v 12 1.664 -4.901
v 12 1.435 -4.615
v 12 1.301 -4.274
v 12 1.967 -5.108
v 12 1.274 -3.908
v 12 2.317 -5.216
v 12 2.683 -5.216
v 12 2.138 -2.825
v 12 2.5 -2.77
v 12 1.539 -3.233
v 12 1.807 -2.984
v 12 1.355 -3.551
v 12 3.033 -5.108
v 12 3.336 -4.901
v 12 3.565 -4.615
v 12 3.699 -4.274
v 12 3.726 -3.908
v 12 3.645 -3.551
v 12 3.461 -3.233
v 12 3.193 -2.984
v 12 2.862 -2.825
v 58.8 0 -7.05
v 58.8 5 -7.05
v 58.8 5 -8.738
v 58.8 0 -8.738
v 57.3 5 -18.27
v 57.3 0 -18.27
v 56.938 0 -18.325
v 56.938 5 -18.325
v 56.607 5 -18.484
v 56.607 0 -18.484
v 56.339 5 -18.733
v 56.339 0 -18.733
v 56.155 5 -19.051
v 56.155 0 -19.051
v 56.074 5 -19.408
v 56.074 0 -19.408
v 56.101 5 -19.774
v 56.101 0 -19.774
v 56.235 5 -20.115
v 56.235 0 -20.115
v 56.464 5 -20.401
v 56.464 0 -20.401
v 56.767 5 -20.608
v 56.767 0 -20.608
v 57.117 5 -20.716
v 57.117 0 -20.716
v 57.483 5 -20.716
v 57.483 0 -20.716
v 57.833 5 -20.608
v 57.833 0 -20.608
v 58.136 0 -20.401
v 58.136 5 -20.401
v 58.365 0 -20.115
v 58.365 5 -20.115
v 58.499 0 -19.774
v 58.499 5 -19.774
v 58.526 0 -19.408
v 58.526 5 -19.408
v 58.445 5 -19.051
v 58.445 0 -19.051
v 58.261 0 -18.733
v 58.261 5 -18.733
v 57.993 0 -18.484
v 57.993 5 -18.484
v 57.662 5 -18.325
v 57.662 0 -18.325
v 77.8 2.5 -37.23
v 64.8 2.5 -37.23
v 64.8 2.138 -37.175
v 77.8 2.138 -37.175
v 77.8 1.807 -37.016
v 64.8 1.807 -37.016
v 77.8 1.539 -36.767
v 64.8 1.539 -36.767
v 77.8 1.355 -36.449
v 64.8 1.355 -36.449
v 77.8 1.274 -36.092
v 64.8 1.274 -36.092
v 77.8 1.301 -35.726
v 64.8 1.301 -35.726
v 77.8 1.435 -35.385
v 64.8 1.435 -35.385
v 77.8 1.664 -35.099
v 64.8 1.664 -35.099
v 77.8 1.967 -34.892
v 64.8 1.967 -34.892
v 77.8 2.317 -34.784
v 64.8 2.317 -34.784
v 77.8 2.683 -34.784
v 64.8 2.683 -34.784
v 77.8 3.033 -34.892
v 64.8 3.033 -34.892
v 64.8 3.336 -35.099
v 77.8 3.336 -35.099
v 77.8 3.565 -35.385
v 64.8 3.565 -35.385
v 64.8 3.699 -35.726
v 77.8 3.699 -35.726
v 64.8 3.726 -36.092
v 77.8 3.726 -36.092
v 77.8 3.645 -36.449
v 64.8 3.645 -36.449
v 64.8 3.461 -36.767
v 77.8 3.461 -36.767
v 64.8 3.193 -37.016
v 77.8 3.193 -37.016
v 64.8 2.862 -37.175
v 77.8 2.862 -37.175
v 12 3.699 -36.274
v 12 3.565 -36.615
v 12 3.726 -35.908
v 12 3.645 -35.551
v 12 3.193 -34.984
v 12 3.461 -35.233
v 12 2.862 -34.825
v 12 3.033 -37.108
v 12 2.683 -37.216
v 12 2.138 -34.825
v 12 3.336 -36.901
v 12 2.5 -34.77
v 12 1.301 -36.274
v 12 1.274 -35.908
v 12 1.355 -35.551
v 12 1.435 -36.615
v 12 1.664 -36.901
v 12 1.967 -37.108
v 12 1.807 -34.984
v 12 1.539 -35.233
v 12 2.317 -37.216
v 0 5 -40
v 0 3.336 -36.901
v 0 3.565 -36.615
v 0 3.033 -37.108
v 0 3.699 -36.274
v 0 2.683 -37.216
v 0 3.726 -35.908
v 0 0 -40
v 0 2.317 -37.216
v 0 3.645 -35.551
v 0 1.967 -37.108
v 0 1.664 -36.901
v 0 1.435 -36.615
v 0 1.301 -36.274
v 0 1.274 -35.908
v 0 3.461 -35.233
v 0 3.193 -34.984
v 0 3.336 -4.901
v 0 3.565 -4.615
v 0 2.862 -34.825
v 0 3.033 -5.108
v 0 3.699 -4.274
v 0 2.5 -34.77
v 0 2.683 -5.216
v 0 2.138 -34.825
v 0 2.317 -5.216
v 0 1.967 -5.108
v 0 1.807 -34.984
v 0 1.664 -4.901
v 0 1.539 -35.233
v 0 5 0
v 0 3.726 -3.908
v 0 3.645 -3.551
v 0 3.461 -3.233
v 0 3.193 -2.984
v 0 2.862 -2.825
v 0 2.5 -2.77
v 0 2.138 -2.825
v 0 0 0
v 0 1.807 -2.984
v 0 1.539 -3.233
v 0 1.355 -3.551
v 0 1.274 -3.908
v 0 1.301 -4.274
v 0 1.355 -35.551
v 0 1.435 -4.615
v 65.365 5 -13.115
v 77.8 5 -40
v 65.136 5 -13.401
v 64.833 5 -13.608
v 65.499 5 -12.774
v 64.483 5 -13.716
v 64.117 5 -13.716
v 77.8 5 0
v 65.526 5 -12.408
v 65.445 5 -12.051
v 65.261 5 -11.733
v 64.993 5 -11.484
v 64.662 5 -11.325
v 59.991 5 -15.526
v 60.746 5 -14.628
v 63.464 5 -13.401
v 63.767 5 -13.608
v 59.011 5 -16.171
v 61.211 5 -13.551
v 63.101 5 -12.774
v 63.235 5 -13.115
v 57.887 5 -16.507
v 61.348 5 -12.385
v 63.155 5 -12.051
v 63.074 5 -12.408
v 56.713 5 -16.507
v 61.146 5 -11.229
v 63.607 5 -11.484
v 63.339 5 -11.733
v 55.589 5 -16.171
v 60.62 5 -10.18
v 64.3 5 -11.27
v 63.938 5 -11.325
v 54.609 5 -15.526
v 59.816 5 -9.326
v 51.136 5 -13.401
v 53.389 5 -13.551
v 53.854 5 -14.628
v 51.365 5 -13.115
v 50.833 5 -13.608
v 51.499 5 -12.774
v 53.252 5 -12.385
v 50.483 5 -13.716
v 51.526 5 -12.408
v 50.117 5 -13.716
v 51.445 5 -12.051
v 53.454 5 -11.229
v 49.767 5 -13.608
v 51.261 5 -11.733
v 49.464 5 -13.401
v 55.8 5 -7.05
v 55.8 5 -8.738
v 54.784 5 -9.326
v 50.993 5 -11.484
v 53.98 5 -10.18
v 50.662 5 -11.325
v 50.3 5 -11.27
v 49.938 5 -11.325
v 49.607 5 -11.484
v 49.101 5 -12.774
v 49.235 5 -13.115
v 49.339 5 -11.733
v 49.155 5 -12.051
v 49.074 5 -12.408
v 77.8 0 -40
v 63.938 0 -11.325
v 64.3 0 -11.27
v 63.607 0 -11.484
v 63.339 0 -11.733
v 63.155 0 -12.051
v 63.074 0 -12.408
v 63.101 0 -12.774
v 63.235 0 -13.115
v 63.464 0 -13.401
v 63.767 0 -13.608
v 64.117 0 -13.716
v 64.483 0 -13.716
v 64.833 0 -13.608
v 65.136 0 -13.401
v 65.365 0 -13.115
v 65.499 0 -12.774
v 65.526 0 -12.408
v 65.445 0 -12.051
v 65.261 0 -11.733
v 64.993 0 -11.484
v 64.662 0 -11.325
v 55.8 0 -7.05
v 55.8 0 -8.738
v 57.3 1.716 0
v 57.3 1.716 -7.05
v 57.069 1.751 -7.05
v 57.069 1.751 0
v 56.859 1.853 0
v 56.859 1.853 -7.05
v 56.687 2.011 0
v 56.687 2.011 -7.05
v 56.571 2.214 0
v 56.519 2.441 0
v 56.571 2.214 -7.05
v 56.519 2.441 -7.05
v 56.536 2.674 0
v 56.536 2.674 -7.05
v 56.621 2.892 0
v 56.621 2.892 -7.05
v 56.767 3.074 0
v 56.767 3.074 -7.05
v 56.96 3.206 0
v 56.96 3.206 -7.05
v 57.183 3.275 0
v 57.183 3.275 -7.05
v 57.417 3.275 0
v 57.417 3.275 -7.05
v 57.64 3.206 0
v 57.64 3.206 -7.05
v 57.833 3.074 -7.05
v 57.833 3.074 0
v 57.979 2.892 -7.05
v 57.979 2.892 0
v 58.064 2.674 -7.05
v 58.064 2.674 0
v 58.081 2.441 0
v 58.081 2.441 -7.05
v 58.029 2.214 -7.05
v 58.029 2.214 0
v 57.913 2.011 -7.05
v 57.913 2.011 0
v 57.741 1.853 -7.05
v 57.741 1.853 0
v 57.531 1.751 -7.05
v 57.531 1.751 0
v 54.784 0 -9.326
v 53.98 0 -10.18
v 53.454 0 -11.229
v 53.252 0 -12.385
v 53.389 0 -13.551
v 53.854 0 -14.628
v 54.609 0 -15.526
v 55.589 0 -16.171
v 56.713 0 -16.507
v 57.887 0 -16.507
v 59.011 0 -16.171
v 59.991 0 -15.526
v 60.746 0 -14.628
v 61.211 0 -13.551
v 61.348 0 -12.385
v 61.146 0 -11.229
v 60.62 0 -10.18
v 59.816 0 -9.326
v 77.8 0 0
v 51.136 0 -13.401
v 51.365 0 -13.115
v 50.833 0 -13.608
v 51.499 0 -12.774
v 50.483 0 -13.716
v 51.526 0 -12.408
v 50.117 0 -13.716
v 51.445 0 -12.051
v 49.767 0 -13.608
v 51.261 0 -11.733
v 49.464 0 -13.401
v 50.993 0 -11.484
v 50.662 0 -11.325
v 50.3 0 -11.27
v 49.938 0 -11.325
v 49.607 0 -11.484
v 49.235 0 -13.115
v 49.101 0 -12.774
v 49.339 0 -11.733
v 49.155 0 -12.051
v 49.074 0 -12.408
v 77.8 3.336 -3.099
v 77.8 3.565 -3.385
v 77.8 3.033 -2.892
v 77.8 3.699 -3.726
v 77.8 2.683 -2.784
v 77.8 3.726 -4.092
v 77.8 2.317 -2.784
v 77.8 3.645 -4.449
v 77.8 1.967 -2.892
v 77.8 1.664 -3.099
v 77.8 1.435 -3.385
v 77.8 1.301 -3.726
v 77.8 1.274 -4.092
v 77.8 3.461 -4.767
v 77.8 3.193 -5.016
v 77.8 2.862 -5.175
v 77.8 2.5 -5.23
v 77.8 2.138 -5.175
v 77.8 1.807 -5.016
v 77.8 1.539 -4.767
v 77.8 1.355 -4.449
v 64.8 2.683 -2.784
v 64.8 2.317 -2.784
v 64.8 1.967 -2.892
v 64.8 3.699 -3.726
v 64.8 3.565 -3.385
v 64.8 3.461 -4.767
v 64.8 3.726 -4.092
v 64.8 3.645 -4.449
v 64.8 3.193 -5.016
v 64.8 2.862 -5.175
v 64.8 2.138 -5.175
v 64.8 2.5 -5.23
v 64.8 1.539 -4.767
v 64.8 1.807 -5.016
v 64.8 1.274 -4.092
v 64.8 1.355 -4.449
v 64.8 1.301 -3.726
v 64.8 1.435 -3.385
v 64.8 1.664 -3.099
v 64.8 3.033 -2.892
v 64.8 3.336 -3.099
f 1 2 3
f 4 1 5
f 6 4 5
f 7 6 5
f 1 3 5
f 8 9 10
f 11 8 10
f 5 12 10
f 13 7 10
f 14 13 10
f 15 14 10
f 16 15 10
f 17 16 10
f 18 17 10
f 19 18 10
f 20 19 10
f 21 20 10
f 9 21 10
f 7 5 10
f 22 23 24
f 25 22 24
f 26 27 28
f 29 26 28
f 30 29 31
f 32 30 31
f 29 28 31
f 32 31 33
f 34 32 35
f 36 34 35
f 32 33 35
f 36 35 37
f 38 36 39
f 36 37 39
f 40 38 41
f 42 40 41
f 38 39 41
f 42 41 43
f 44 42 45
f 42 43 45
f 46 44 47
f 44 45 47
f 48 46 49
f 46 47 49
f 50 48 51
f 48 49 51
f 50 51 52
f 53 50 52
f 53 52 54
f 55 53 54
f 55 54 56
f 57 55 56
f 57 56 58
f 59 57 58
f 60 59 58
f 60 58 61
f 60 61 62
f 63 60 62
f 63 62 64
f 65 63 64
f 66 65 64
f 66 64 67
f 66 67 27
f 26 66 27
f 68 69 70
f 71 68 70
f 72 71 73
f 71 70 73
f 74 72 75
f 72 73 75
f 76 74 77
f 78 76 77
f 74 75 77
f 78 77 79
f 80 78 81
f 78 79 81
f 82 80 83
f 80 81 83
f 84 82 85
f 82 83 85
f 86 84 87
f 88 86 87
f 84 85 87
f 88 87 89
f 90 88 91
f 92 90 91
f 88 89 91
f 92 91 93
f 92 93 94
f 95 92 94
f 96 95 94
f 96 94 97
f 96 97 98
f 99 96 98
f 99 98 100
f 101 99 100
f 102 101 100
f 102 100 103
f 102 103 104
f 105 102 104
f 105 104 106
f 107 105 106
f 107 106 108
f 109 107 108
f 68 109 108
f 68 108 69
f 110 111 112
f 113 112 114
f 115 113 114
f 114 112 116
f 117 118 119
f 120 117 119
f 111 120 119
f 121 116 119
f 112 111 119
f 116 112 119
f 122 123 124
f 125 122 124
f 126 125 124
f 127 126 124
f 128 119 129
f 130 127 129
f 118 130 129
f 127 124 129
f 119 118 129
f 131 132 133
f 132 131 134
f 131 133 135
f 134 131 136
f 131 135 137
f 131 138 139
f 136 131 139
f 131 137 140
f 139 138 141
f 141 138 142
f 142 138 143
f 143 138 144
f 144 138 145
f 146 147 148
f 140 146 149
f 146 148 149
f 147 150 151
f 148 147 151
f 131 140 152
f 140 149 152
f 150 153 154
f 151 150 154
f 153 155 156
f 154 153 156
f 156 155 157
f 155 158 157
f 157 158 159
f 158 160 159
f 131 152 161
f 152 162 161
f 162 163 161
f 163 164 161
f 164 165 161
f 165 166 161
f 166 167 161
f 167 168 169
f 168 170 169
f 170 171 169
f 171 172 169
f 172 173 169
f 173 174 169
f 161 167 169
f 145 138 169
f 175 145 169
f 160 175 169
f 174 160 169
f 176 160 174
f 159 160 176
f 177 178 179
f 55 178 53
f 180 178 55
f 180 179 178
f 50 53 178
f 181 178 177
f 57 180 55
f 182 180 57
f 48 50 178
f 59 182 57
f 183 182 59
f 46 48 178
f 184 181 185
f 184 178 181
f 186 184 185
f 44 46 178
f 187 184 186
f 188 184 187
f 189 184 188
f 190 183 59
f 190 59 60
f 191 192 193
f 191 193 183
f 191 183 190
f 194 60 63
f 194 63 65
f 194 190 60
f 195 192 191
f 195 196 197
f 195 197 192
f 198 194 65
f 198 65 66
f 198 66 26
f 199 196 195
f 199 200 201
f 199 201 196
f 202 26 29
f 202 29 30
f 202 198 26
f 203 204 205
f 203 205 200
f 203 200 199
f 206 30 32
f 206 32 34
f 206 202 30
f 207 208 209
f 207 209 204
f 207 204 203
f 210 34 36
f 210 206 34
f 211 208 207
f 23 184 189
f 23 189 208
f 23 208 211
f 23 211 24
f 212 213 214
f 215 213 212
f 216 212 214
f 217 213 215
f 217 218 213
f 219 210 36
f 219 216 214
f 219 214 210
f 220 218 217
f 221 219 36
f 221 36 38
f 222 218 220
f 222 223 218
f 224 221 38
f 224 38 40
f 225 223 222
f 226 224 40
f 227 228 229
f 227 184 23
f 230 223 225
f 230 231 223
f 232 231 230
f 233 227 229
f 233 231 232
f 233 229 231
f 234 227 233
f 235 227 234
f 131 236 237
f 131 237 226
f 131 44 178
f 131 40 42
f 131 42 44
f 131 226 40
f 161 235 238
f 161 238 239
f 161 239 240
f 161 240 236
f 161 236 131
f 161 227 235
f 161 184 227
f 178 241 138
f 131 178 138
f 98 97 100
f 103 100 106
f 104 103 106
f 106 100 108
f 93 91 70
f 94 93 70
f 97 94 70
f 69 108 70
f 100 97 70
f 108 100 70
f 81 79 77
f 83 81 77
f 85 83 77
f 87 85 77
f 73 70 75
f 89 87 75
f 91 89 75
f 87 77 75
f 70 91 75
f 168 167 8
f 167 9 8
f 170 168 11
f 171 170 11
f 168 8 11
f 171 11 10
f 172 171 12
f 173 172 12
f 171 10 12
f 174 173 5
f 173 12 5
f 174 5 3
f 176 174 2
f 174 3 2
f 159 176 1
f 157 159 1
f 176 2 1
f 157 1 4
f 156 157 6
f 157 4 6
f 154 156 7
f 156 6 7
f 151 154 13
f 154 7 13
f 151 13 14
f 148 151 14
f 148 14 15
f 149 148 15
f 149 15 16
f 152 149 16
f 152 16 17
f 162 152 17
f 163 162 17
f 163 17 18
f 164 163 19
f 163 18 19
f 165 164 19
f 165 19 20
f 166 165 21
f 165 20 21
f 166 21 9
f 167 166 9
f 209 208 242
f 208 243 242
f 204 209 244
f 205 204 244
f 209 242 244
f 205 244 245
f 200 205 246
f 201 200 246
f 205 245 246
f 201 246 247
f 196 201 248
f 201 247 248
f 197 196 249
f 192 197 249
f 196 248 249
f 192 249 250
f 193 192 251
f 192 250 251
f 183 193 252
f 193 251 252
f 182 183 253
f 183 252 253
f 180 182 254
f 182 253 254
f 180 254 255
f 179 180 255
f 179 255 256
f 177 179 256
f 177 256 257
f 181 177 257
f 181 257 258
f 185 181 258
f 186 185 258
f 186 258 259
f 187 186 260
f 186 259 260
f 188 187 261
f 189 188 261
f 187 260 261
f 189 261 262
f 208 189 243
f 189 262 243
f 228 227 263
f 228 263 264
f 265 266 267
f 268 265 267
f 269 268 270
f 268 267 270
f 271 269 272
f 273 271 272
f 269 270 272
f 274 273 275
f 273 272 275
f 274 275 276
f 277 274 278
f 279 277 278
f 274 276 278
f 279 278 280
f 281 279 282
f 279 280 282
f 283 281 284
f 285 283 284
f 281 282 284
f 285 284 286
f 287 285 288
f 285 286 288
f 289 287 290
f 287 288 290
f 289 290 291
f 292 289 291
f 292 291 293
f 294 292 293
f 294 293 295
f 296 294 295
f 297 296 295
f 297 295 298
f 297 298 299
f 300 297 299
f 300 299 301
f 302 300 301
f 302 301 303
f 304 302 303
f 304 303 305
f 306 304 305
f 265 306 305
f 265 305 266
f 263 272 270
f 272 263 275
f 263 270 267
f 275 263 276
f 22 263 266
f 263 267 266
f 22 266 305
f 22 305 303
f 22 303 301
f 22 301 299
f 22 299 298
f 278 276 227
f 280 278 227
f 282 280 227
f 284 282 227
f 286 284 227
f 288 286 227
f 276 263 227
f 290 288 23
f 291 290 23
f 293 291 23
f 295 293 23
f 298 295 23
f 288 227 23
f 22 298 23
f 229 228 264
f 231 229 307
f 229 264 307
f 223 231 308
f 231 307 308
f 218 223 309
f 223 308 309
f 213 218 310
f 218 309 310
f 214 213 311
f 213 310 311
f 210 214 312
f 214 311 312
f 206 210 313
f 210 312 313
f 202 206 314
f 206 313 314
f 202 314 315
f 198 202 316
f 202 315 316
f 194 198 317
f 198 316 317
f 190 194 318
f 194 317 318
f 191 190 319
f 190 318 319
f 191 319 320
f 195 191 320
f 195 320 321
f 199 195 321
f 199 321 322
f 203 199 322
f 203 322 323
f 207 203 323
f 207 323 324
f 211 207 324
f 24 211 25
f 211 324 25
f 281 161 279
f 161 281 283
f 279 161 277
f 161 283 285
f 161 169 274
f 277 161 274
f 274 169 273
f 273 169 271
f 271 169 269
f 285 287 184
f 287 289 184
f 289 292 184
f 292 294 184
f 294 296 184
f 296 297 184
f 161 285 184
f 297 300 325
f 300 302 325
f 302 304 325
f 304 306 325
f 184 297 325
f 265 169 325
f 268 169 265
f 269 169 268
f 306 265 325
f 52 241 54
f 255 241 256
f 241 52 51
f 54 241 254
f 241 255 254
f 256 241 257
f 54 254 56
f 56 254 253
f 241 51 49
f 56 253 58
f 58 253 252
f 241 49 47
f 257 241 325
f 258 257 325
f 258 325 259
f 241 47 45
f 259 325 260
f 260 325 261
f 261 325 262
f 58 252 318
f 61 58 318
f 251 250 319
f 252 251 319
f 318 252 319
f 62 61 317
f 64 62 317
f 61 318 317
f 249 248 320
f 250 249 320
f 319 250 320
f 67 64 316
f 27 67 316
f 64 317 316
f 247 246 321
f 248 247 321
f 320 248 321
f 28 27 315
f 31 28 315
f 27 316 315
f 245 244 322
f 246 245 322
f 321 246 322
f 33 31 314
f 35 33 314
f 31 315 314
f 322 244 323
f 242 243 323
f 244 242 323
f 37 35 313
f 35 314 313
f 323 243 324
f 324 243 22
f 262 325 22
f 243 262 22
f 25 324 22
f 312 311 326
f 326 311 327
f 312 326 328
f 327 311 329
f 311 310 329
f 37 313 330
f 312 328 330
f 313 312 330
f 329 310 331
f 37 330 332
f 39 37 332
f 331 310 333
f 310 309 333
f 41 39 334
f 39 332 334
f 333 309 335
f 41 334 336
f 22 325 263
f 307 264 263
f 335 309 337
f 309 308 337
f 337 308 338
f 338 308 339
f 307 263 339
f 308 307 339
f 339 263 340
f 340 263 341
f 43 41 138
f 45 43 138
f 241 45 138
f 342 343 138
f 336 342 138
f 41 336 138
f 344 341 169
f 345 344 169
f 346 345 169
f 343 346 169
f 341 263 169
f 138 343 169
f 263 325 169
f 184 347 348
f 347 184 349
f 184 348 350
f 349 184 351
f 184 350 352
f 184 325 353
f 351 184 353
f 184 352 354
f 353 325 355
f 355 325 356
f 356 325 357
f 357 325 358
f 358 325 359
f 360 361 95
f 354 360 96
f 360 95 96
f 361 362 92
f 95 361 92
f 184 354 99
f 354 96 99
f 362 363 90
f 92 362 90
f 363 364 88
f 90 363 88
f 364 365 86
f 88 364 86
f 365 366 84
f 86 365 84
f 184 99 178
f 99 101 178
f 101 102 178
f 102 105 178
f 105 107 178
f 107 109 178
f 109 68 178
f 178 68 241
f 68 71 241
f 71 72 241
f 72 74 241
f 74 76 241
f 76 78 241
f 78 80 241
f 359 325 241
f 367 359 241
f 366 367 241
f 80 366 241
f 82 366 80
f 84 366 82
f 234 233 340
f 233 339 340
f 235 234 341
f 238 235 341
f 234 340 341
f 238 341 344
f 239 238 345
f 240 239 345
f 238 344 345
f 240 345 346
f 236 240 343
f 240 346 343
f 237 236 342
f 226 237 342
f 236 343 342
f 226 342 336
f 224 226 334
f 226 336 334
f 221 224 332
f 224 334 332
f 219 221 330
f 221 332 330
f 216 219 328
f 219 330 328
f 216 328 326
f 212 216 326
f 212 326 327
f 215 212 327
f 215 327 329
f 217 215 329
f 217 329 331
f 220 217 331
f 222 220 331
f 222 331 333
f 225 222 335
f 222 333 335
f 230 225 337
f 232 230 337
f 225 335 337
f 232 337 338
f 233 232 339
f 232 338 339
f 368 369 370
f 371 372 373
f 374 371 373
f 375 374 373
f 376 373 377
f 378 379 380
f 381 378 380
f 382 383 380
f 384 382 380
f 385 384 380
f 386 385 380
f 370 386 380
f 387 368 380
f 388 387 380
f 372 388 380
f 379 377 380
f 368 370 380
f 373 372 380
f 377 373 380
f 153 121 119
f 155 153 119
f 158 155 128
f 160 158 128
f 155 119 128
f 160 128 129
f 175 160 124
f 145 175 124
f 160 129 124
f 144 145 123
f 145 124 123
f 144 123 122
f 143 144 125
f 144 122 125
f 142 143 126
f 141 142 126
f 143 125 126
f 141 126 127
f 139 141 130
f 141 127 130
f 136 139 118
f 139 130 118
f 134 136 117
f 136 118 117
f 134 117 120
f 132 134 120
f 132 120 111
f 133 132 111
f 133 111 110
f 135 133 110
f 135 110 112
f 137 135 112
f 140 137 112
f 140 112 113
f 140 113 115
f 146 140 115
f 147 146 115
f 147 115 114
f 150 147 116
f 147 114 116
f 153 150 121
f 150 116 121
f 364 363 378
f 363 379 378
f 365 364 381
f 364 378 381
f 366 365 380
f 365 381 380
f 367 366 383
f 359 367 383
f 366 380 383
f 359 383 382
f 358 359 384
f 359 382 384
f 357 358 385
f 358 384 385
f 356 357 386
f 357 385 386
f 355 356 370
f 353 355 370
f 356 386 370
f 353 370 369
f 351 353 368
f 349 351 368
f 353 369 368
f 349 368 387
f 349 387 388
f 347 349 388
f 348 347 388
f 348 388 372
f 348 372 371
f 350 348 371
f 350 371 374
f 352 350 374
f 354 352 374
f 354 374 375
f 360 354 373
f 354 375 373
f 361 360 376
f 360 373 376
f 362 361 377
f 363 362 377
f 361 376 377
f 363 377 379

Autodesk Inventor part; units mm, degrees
ref_plane "YZ Plane" through (0, 0, 0) normal (1, 0, 0) x (0, 1, 0)
ref_plane "XZ Plane" through (0, 0, 0) normal (0, 1, 0) x (-1, 0, 0)
ref_plane "XY Plane" through (0, 0, 0) normal (0, 0, 1) x (1, 0, 0)
sketch "スケッチ2" plane through (0, 0, 0) normal (0, 1, 0) x (-1, 0, 0)
  line L0 (0, 0) -> (-77.8, 0)
  line L1 (-77.8, 0) -> (-77.8, -40)
  line L2 (-77.8, -40) -> (0, -40)
  line L3 (0, -40) -> (0, 0)
  dimension "d0" = 77.8
  dimension "d1" = 40
extrude "押し出し1" add sketch "スケッチ2" along normal blind 5
sketch "スケッチ4" plane through (0, 0, -40) normal (-1, 0, 0) x (0, 0, 1)
  line L0 (0, 0) -> (0, 5) construction
  line L1 (0, 2.5) -> (40, 2.5) construction
  line L2 (40, 0) -> (40, 5) construction
  point P0 (4, 2.5)
  point P1 (36, 2.5)
  dimension "d4" = 4
  dimension "d5" = 4
hole "穴1" at (0, 2.5, -36) at (0, 2.5, -4) direction (1, 0, 0) diameter 2.459 depth 12 thread size "M3x0.5" class "6H" standard "ISO Metric profile"
sketch "スケッチ5" plane through (77.8, 0, 0) normal (1, 0, 0) x (0, 0, -1)
  line L0 (0, 0) -> (0, 5) construction
  line L1 (0, 2.5) -> (39.9198, 2.5) construction
  circle A0 centre (4, 2.5) radius 1.2295 construction
  circle A1 centre (36, 2.5) radius 1.2295 projected
  point P0 (4, 2.5)
  point P1 (36, 2.5)
hole "穴2" at (77.8, 2.5, -4) at (77.8, 2.5, -36) direction (-1, 0, 0) diameter 2.459 depth 13 thread size "M3x0.5" class "6H" standard "ISO Metric profile"
sketch "スケッチ6" plane through (0, 5, 0) normal (0, 1, 0) x (1, 0, 0)
  line L0 (77.8, 0) -> (77.8, 40) construction
  line L1 (0, 40) -> (0, 0) construction
  line L2 (0, 0) -> (77.8, 0) construction
  point P0 (57.3, 12.5)
  dimension "d20" = 20.5
  dimension "d21" = 12.5
hole "穴3" at (57.3, 5, -12.5) direction (0, -1, 0) diameter 8.1 end through all
sketch "スケッチ7" plane through (0, 5, 0) normal (0, 1, 0) x (1, 0, 0)
  line L0 (77.8, 0) -> (77.8, 40) construction
  line L1 (77.8, 28.3) -> (0, 28.3) construction
  line L2 (0, 40) -> (0, 0) construction
  circle A0 centre (57.3, 12.5) radius 4.05 construction
  point P0 (67.8, 28.3)
  point P1 (46.8, 28.3)
  dimension "d29" = 15.8
  dimension "d30" = 10.5
  dimension "d31" = 10.5
hole "穴4" [suppressed]
sketch "スケッチ11" plane through (0, 5, 0) normal (0, 1, 0) x (1, 0, 0)
  circle A0 centre (57.3, 12.5) radius 4.05 projected
  line L0 (55.8, 7.05) -> (58.8, 7.05)
  line L1 (58.8, 7.05) -> (58.8, 8.45)
  line L2 (58.8, 8.45) -> (55.8, 8.45)
  line L3 (55.8, 8.45) -> (55.8, 7.05)
  line L4 (55.8, 8.45) -> (55.8, 8.738)
  line L5 (58.8, 8.45) -> (58.8, 8.738)
  point P0 (0, 0)
  point P1 (57.3, 8.45)
  dimension "d68" = 1.4
  dimension "d69" = 3
extrude "押し出し3" cut sketch "スケッチ11" against normal through all contours A0 L2 L4 | L5 L2 A0 | L2 L1 L0 L3
sketch "スケッチ8" plane through (0, 5, 0) normal (0, 1, 0) x (1, 0, 0)
  arc A0 (58.8, 8.738) -> (55.8, 8.738) centre (57.3, 12.5) ccw construction
  circle A1 centre (57.3, 12.5) radius 7 construction
  point P0 (0, 0)
  point P1 (57.3, 19.5)
  point P2 (50.3, 12.5)
  point P3 (64.3, 12.5)
  dimension "d39" = 14
hole "穴5" at (57.3, 5, -19.5) at (50.3, 5, -12.5) at (64.3, 5, -12.5) direction (0, -1, 0) diameter 2.459 end through all thread size "M3x0.5" class "6H" standard "ISO Metric profile"
sketch "スケッチ9" plane through (0, 5, 0) normal (0, 1, 0) x (1, 0, 0)
  circle A0 centre (57.3, 12.5) radius 4.05 projected
  line L0 (57.3, 12.5) -> (45.9478, 12.5) construction
  line L1 (51.85, 14) -> (53.25, 14)
  line L2 (53.25, 14) -> (53.25, 11)
  line L3 (53.25, 11) -> (51.85, 11)
  line L4 (51.85, 11) -> (51.85, 14)
  line L5 (51.85, 14) -> (53.25, 11) construction
  line L6 (53.25, 14) -> (51.85, 11) construction
  line L7 (53.25, 11) -> (53.538, 11)
  line L8 (53.25, 14) -> (53.538, 14)
  point P0 (0, 0)
  point P1 (52.55, 12.5)
  point P2 (53.25, 12.5)
  dimension "d56" = 1.4
  dimension "d57" = 0
  dimension "d58" = 3
extrude "押し出し2" [suppressed]
sketch "スケッチ12" plane through (0, 5, 0) normal (0, 1, 0) x (1, 0, 0)
  arc A0 (58.8, 8.738) -> (55.8, 8.738) centre (57.3, 12.5) ccw projected
  point P0 (0, 0)
  point P1 (50.3, 12.5)
  point P2 (57.3, 5.5)
  point P3 (64.3, 12.5)
  point P4 (57.3, 19.5)
  dimension "d74" = 360
  dimension "d76" = 14
hole "穴7" [suppressed]
sketch "スケッチ13" plane through (0, 0, 0) normal (0, 0, 1) x (1, 0, 0)
  line L0 (58.8, 5) -> (55.8, 5) projected
  line L1 (77.8, 0) -> (77.8, 5) projected
  point P0 (0, 0)
  point P1 (57.3, 2.5)
  point P2 (57.3, 5)
  point P3 (77.8, 2.5)
hole "穴8" at (57.3, 2.5, 0) direction (0, 0, -1) diameter 1.567 depth 7.05 thread size "M2x0.4" class "6H" standard "ISO Metric profile"
properties part number "shoulder1_verticval_cover" material "アルミニウム 5052"
